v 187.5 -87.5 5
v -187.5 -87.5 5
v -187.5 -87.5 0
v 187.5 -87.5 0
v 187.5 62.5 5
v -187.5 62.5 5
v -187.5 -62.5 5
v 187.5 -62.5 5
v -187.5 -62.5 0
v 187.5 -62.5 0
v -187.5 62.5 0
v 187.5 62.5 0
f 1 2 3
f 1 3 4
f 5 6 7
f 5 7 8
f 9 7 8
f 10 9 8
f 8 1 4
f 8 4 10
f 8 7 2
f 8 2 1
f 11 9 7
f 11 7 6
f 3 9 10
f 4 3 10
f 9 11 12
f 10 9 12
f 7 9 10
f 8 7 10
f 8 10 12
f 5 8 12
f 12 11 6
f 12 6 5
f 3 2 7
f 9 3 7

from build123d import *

# Parameters (mm, degrees)
SKETCH1_W           = 375
SKETCH1_H           = 125
BOSS_EXTRUDE1_DEPTH = 5
SKETCH2_W           = 375
SKETCH2_H           = 25
BOSS_EXTRUDE2_DEPTH = 5


with BuildPart() as part:
    # Sketch1 → Boss-Extrude1 (new body)
    with BuildSketch(Plane.XY):
        Rectangle(SKETCH1_W, SKETCH1_H)
    extrude(amount=BOSS_EXTRUDE1_DEPTH)


with BuildPart() as body_2:
    # Sketch2 → Boss-Extrude2 (new body)
    with BuildSketch(Plane.XY.offset(5)):
        with Locations((0, -75)):
            Rectangle(SKETCH2_W, SKETCH2_H)
    extrude(amount=-BOSS_EXTRUDE2_DEPTH)


solid = Compound([part.part, body_2.part])
